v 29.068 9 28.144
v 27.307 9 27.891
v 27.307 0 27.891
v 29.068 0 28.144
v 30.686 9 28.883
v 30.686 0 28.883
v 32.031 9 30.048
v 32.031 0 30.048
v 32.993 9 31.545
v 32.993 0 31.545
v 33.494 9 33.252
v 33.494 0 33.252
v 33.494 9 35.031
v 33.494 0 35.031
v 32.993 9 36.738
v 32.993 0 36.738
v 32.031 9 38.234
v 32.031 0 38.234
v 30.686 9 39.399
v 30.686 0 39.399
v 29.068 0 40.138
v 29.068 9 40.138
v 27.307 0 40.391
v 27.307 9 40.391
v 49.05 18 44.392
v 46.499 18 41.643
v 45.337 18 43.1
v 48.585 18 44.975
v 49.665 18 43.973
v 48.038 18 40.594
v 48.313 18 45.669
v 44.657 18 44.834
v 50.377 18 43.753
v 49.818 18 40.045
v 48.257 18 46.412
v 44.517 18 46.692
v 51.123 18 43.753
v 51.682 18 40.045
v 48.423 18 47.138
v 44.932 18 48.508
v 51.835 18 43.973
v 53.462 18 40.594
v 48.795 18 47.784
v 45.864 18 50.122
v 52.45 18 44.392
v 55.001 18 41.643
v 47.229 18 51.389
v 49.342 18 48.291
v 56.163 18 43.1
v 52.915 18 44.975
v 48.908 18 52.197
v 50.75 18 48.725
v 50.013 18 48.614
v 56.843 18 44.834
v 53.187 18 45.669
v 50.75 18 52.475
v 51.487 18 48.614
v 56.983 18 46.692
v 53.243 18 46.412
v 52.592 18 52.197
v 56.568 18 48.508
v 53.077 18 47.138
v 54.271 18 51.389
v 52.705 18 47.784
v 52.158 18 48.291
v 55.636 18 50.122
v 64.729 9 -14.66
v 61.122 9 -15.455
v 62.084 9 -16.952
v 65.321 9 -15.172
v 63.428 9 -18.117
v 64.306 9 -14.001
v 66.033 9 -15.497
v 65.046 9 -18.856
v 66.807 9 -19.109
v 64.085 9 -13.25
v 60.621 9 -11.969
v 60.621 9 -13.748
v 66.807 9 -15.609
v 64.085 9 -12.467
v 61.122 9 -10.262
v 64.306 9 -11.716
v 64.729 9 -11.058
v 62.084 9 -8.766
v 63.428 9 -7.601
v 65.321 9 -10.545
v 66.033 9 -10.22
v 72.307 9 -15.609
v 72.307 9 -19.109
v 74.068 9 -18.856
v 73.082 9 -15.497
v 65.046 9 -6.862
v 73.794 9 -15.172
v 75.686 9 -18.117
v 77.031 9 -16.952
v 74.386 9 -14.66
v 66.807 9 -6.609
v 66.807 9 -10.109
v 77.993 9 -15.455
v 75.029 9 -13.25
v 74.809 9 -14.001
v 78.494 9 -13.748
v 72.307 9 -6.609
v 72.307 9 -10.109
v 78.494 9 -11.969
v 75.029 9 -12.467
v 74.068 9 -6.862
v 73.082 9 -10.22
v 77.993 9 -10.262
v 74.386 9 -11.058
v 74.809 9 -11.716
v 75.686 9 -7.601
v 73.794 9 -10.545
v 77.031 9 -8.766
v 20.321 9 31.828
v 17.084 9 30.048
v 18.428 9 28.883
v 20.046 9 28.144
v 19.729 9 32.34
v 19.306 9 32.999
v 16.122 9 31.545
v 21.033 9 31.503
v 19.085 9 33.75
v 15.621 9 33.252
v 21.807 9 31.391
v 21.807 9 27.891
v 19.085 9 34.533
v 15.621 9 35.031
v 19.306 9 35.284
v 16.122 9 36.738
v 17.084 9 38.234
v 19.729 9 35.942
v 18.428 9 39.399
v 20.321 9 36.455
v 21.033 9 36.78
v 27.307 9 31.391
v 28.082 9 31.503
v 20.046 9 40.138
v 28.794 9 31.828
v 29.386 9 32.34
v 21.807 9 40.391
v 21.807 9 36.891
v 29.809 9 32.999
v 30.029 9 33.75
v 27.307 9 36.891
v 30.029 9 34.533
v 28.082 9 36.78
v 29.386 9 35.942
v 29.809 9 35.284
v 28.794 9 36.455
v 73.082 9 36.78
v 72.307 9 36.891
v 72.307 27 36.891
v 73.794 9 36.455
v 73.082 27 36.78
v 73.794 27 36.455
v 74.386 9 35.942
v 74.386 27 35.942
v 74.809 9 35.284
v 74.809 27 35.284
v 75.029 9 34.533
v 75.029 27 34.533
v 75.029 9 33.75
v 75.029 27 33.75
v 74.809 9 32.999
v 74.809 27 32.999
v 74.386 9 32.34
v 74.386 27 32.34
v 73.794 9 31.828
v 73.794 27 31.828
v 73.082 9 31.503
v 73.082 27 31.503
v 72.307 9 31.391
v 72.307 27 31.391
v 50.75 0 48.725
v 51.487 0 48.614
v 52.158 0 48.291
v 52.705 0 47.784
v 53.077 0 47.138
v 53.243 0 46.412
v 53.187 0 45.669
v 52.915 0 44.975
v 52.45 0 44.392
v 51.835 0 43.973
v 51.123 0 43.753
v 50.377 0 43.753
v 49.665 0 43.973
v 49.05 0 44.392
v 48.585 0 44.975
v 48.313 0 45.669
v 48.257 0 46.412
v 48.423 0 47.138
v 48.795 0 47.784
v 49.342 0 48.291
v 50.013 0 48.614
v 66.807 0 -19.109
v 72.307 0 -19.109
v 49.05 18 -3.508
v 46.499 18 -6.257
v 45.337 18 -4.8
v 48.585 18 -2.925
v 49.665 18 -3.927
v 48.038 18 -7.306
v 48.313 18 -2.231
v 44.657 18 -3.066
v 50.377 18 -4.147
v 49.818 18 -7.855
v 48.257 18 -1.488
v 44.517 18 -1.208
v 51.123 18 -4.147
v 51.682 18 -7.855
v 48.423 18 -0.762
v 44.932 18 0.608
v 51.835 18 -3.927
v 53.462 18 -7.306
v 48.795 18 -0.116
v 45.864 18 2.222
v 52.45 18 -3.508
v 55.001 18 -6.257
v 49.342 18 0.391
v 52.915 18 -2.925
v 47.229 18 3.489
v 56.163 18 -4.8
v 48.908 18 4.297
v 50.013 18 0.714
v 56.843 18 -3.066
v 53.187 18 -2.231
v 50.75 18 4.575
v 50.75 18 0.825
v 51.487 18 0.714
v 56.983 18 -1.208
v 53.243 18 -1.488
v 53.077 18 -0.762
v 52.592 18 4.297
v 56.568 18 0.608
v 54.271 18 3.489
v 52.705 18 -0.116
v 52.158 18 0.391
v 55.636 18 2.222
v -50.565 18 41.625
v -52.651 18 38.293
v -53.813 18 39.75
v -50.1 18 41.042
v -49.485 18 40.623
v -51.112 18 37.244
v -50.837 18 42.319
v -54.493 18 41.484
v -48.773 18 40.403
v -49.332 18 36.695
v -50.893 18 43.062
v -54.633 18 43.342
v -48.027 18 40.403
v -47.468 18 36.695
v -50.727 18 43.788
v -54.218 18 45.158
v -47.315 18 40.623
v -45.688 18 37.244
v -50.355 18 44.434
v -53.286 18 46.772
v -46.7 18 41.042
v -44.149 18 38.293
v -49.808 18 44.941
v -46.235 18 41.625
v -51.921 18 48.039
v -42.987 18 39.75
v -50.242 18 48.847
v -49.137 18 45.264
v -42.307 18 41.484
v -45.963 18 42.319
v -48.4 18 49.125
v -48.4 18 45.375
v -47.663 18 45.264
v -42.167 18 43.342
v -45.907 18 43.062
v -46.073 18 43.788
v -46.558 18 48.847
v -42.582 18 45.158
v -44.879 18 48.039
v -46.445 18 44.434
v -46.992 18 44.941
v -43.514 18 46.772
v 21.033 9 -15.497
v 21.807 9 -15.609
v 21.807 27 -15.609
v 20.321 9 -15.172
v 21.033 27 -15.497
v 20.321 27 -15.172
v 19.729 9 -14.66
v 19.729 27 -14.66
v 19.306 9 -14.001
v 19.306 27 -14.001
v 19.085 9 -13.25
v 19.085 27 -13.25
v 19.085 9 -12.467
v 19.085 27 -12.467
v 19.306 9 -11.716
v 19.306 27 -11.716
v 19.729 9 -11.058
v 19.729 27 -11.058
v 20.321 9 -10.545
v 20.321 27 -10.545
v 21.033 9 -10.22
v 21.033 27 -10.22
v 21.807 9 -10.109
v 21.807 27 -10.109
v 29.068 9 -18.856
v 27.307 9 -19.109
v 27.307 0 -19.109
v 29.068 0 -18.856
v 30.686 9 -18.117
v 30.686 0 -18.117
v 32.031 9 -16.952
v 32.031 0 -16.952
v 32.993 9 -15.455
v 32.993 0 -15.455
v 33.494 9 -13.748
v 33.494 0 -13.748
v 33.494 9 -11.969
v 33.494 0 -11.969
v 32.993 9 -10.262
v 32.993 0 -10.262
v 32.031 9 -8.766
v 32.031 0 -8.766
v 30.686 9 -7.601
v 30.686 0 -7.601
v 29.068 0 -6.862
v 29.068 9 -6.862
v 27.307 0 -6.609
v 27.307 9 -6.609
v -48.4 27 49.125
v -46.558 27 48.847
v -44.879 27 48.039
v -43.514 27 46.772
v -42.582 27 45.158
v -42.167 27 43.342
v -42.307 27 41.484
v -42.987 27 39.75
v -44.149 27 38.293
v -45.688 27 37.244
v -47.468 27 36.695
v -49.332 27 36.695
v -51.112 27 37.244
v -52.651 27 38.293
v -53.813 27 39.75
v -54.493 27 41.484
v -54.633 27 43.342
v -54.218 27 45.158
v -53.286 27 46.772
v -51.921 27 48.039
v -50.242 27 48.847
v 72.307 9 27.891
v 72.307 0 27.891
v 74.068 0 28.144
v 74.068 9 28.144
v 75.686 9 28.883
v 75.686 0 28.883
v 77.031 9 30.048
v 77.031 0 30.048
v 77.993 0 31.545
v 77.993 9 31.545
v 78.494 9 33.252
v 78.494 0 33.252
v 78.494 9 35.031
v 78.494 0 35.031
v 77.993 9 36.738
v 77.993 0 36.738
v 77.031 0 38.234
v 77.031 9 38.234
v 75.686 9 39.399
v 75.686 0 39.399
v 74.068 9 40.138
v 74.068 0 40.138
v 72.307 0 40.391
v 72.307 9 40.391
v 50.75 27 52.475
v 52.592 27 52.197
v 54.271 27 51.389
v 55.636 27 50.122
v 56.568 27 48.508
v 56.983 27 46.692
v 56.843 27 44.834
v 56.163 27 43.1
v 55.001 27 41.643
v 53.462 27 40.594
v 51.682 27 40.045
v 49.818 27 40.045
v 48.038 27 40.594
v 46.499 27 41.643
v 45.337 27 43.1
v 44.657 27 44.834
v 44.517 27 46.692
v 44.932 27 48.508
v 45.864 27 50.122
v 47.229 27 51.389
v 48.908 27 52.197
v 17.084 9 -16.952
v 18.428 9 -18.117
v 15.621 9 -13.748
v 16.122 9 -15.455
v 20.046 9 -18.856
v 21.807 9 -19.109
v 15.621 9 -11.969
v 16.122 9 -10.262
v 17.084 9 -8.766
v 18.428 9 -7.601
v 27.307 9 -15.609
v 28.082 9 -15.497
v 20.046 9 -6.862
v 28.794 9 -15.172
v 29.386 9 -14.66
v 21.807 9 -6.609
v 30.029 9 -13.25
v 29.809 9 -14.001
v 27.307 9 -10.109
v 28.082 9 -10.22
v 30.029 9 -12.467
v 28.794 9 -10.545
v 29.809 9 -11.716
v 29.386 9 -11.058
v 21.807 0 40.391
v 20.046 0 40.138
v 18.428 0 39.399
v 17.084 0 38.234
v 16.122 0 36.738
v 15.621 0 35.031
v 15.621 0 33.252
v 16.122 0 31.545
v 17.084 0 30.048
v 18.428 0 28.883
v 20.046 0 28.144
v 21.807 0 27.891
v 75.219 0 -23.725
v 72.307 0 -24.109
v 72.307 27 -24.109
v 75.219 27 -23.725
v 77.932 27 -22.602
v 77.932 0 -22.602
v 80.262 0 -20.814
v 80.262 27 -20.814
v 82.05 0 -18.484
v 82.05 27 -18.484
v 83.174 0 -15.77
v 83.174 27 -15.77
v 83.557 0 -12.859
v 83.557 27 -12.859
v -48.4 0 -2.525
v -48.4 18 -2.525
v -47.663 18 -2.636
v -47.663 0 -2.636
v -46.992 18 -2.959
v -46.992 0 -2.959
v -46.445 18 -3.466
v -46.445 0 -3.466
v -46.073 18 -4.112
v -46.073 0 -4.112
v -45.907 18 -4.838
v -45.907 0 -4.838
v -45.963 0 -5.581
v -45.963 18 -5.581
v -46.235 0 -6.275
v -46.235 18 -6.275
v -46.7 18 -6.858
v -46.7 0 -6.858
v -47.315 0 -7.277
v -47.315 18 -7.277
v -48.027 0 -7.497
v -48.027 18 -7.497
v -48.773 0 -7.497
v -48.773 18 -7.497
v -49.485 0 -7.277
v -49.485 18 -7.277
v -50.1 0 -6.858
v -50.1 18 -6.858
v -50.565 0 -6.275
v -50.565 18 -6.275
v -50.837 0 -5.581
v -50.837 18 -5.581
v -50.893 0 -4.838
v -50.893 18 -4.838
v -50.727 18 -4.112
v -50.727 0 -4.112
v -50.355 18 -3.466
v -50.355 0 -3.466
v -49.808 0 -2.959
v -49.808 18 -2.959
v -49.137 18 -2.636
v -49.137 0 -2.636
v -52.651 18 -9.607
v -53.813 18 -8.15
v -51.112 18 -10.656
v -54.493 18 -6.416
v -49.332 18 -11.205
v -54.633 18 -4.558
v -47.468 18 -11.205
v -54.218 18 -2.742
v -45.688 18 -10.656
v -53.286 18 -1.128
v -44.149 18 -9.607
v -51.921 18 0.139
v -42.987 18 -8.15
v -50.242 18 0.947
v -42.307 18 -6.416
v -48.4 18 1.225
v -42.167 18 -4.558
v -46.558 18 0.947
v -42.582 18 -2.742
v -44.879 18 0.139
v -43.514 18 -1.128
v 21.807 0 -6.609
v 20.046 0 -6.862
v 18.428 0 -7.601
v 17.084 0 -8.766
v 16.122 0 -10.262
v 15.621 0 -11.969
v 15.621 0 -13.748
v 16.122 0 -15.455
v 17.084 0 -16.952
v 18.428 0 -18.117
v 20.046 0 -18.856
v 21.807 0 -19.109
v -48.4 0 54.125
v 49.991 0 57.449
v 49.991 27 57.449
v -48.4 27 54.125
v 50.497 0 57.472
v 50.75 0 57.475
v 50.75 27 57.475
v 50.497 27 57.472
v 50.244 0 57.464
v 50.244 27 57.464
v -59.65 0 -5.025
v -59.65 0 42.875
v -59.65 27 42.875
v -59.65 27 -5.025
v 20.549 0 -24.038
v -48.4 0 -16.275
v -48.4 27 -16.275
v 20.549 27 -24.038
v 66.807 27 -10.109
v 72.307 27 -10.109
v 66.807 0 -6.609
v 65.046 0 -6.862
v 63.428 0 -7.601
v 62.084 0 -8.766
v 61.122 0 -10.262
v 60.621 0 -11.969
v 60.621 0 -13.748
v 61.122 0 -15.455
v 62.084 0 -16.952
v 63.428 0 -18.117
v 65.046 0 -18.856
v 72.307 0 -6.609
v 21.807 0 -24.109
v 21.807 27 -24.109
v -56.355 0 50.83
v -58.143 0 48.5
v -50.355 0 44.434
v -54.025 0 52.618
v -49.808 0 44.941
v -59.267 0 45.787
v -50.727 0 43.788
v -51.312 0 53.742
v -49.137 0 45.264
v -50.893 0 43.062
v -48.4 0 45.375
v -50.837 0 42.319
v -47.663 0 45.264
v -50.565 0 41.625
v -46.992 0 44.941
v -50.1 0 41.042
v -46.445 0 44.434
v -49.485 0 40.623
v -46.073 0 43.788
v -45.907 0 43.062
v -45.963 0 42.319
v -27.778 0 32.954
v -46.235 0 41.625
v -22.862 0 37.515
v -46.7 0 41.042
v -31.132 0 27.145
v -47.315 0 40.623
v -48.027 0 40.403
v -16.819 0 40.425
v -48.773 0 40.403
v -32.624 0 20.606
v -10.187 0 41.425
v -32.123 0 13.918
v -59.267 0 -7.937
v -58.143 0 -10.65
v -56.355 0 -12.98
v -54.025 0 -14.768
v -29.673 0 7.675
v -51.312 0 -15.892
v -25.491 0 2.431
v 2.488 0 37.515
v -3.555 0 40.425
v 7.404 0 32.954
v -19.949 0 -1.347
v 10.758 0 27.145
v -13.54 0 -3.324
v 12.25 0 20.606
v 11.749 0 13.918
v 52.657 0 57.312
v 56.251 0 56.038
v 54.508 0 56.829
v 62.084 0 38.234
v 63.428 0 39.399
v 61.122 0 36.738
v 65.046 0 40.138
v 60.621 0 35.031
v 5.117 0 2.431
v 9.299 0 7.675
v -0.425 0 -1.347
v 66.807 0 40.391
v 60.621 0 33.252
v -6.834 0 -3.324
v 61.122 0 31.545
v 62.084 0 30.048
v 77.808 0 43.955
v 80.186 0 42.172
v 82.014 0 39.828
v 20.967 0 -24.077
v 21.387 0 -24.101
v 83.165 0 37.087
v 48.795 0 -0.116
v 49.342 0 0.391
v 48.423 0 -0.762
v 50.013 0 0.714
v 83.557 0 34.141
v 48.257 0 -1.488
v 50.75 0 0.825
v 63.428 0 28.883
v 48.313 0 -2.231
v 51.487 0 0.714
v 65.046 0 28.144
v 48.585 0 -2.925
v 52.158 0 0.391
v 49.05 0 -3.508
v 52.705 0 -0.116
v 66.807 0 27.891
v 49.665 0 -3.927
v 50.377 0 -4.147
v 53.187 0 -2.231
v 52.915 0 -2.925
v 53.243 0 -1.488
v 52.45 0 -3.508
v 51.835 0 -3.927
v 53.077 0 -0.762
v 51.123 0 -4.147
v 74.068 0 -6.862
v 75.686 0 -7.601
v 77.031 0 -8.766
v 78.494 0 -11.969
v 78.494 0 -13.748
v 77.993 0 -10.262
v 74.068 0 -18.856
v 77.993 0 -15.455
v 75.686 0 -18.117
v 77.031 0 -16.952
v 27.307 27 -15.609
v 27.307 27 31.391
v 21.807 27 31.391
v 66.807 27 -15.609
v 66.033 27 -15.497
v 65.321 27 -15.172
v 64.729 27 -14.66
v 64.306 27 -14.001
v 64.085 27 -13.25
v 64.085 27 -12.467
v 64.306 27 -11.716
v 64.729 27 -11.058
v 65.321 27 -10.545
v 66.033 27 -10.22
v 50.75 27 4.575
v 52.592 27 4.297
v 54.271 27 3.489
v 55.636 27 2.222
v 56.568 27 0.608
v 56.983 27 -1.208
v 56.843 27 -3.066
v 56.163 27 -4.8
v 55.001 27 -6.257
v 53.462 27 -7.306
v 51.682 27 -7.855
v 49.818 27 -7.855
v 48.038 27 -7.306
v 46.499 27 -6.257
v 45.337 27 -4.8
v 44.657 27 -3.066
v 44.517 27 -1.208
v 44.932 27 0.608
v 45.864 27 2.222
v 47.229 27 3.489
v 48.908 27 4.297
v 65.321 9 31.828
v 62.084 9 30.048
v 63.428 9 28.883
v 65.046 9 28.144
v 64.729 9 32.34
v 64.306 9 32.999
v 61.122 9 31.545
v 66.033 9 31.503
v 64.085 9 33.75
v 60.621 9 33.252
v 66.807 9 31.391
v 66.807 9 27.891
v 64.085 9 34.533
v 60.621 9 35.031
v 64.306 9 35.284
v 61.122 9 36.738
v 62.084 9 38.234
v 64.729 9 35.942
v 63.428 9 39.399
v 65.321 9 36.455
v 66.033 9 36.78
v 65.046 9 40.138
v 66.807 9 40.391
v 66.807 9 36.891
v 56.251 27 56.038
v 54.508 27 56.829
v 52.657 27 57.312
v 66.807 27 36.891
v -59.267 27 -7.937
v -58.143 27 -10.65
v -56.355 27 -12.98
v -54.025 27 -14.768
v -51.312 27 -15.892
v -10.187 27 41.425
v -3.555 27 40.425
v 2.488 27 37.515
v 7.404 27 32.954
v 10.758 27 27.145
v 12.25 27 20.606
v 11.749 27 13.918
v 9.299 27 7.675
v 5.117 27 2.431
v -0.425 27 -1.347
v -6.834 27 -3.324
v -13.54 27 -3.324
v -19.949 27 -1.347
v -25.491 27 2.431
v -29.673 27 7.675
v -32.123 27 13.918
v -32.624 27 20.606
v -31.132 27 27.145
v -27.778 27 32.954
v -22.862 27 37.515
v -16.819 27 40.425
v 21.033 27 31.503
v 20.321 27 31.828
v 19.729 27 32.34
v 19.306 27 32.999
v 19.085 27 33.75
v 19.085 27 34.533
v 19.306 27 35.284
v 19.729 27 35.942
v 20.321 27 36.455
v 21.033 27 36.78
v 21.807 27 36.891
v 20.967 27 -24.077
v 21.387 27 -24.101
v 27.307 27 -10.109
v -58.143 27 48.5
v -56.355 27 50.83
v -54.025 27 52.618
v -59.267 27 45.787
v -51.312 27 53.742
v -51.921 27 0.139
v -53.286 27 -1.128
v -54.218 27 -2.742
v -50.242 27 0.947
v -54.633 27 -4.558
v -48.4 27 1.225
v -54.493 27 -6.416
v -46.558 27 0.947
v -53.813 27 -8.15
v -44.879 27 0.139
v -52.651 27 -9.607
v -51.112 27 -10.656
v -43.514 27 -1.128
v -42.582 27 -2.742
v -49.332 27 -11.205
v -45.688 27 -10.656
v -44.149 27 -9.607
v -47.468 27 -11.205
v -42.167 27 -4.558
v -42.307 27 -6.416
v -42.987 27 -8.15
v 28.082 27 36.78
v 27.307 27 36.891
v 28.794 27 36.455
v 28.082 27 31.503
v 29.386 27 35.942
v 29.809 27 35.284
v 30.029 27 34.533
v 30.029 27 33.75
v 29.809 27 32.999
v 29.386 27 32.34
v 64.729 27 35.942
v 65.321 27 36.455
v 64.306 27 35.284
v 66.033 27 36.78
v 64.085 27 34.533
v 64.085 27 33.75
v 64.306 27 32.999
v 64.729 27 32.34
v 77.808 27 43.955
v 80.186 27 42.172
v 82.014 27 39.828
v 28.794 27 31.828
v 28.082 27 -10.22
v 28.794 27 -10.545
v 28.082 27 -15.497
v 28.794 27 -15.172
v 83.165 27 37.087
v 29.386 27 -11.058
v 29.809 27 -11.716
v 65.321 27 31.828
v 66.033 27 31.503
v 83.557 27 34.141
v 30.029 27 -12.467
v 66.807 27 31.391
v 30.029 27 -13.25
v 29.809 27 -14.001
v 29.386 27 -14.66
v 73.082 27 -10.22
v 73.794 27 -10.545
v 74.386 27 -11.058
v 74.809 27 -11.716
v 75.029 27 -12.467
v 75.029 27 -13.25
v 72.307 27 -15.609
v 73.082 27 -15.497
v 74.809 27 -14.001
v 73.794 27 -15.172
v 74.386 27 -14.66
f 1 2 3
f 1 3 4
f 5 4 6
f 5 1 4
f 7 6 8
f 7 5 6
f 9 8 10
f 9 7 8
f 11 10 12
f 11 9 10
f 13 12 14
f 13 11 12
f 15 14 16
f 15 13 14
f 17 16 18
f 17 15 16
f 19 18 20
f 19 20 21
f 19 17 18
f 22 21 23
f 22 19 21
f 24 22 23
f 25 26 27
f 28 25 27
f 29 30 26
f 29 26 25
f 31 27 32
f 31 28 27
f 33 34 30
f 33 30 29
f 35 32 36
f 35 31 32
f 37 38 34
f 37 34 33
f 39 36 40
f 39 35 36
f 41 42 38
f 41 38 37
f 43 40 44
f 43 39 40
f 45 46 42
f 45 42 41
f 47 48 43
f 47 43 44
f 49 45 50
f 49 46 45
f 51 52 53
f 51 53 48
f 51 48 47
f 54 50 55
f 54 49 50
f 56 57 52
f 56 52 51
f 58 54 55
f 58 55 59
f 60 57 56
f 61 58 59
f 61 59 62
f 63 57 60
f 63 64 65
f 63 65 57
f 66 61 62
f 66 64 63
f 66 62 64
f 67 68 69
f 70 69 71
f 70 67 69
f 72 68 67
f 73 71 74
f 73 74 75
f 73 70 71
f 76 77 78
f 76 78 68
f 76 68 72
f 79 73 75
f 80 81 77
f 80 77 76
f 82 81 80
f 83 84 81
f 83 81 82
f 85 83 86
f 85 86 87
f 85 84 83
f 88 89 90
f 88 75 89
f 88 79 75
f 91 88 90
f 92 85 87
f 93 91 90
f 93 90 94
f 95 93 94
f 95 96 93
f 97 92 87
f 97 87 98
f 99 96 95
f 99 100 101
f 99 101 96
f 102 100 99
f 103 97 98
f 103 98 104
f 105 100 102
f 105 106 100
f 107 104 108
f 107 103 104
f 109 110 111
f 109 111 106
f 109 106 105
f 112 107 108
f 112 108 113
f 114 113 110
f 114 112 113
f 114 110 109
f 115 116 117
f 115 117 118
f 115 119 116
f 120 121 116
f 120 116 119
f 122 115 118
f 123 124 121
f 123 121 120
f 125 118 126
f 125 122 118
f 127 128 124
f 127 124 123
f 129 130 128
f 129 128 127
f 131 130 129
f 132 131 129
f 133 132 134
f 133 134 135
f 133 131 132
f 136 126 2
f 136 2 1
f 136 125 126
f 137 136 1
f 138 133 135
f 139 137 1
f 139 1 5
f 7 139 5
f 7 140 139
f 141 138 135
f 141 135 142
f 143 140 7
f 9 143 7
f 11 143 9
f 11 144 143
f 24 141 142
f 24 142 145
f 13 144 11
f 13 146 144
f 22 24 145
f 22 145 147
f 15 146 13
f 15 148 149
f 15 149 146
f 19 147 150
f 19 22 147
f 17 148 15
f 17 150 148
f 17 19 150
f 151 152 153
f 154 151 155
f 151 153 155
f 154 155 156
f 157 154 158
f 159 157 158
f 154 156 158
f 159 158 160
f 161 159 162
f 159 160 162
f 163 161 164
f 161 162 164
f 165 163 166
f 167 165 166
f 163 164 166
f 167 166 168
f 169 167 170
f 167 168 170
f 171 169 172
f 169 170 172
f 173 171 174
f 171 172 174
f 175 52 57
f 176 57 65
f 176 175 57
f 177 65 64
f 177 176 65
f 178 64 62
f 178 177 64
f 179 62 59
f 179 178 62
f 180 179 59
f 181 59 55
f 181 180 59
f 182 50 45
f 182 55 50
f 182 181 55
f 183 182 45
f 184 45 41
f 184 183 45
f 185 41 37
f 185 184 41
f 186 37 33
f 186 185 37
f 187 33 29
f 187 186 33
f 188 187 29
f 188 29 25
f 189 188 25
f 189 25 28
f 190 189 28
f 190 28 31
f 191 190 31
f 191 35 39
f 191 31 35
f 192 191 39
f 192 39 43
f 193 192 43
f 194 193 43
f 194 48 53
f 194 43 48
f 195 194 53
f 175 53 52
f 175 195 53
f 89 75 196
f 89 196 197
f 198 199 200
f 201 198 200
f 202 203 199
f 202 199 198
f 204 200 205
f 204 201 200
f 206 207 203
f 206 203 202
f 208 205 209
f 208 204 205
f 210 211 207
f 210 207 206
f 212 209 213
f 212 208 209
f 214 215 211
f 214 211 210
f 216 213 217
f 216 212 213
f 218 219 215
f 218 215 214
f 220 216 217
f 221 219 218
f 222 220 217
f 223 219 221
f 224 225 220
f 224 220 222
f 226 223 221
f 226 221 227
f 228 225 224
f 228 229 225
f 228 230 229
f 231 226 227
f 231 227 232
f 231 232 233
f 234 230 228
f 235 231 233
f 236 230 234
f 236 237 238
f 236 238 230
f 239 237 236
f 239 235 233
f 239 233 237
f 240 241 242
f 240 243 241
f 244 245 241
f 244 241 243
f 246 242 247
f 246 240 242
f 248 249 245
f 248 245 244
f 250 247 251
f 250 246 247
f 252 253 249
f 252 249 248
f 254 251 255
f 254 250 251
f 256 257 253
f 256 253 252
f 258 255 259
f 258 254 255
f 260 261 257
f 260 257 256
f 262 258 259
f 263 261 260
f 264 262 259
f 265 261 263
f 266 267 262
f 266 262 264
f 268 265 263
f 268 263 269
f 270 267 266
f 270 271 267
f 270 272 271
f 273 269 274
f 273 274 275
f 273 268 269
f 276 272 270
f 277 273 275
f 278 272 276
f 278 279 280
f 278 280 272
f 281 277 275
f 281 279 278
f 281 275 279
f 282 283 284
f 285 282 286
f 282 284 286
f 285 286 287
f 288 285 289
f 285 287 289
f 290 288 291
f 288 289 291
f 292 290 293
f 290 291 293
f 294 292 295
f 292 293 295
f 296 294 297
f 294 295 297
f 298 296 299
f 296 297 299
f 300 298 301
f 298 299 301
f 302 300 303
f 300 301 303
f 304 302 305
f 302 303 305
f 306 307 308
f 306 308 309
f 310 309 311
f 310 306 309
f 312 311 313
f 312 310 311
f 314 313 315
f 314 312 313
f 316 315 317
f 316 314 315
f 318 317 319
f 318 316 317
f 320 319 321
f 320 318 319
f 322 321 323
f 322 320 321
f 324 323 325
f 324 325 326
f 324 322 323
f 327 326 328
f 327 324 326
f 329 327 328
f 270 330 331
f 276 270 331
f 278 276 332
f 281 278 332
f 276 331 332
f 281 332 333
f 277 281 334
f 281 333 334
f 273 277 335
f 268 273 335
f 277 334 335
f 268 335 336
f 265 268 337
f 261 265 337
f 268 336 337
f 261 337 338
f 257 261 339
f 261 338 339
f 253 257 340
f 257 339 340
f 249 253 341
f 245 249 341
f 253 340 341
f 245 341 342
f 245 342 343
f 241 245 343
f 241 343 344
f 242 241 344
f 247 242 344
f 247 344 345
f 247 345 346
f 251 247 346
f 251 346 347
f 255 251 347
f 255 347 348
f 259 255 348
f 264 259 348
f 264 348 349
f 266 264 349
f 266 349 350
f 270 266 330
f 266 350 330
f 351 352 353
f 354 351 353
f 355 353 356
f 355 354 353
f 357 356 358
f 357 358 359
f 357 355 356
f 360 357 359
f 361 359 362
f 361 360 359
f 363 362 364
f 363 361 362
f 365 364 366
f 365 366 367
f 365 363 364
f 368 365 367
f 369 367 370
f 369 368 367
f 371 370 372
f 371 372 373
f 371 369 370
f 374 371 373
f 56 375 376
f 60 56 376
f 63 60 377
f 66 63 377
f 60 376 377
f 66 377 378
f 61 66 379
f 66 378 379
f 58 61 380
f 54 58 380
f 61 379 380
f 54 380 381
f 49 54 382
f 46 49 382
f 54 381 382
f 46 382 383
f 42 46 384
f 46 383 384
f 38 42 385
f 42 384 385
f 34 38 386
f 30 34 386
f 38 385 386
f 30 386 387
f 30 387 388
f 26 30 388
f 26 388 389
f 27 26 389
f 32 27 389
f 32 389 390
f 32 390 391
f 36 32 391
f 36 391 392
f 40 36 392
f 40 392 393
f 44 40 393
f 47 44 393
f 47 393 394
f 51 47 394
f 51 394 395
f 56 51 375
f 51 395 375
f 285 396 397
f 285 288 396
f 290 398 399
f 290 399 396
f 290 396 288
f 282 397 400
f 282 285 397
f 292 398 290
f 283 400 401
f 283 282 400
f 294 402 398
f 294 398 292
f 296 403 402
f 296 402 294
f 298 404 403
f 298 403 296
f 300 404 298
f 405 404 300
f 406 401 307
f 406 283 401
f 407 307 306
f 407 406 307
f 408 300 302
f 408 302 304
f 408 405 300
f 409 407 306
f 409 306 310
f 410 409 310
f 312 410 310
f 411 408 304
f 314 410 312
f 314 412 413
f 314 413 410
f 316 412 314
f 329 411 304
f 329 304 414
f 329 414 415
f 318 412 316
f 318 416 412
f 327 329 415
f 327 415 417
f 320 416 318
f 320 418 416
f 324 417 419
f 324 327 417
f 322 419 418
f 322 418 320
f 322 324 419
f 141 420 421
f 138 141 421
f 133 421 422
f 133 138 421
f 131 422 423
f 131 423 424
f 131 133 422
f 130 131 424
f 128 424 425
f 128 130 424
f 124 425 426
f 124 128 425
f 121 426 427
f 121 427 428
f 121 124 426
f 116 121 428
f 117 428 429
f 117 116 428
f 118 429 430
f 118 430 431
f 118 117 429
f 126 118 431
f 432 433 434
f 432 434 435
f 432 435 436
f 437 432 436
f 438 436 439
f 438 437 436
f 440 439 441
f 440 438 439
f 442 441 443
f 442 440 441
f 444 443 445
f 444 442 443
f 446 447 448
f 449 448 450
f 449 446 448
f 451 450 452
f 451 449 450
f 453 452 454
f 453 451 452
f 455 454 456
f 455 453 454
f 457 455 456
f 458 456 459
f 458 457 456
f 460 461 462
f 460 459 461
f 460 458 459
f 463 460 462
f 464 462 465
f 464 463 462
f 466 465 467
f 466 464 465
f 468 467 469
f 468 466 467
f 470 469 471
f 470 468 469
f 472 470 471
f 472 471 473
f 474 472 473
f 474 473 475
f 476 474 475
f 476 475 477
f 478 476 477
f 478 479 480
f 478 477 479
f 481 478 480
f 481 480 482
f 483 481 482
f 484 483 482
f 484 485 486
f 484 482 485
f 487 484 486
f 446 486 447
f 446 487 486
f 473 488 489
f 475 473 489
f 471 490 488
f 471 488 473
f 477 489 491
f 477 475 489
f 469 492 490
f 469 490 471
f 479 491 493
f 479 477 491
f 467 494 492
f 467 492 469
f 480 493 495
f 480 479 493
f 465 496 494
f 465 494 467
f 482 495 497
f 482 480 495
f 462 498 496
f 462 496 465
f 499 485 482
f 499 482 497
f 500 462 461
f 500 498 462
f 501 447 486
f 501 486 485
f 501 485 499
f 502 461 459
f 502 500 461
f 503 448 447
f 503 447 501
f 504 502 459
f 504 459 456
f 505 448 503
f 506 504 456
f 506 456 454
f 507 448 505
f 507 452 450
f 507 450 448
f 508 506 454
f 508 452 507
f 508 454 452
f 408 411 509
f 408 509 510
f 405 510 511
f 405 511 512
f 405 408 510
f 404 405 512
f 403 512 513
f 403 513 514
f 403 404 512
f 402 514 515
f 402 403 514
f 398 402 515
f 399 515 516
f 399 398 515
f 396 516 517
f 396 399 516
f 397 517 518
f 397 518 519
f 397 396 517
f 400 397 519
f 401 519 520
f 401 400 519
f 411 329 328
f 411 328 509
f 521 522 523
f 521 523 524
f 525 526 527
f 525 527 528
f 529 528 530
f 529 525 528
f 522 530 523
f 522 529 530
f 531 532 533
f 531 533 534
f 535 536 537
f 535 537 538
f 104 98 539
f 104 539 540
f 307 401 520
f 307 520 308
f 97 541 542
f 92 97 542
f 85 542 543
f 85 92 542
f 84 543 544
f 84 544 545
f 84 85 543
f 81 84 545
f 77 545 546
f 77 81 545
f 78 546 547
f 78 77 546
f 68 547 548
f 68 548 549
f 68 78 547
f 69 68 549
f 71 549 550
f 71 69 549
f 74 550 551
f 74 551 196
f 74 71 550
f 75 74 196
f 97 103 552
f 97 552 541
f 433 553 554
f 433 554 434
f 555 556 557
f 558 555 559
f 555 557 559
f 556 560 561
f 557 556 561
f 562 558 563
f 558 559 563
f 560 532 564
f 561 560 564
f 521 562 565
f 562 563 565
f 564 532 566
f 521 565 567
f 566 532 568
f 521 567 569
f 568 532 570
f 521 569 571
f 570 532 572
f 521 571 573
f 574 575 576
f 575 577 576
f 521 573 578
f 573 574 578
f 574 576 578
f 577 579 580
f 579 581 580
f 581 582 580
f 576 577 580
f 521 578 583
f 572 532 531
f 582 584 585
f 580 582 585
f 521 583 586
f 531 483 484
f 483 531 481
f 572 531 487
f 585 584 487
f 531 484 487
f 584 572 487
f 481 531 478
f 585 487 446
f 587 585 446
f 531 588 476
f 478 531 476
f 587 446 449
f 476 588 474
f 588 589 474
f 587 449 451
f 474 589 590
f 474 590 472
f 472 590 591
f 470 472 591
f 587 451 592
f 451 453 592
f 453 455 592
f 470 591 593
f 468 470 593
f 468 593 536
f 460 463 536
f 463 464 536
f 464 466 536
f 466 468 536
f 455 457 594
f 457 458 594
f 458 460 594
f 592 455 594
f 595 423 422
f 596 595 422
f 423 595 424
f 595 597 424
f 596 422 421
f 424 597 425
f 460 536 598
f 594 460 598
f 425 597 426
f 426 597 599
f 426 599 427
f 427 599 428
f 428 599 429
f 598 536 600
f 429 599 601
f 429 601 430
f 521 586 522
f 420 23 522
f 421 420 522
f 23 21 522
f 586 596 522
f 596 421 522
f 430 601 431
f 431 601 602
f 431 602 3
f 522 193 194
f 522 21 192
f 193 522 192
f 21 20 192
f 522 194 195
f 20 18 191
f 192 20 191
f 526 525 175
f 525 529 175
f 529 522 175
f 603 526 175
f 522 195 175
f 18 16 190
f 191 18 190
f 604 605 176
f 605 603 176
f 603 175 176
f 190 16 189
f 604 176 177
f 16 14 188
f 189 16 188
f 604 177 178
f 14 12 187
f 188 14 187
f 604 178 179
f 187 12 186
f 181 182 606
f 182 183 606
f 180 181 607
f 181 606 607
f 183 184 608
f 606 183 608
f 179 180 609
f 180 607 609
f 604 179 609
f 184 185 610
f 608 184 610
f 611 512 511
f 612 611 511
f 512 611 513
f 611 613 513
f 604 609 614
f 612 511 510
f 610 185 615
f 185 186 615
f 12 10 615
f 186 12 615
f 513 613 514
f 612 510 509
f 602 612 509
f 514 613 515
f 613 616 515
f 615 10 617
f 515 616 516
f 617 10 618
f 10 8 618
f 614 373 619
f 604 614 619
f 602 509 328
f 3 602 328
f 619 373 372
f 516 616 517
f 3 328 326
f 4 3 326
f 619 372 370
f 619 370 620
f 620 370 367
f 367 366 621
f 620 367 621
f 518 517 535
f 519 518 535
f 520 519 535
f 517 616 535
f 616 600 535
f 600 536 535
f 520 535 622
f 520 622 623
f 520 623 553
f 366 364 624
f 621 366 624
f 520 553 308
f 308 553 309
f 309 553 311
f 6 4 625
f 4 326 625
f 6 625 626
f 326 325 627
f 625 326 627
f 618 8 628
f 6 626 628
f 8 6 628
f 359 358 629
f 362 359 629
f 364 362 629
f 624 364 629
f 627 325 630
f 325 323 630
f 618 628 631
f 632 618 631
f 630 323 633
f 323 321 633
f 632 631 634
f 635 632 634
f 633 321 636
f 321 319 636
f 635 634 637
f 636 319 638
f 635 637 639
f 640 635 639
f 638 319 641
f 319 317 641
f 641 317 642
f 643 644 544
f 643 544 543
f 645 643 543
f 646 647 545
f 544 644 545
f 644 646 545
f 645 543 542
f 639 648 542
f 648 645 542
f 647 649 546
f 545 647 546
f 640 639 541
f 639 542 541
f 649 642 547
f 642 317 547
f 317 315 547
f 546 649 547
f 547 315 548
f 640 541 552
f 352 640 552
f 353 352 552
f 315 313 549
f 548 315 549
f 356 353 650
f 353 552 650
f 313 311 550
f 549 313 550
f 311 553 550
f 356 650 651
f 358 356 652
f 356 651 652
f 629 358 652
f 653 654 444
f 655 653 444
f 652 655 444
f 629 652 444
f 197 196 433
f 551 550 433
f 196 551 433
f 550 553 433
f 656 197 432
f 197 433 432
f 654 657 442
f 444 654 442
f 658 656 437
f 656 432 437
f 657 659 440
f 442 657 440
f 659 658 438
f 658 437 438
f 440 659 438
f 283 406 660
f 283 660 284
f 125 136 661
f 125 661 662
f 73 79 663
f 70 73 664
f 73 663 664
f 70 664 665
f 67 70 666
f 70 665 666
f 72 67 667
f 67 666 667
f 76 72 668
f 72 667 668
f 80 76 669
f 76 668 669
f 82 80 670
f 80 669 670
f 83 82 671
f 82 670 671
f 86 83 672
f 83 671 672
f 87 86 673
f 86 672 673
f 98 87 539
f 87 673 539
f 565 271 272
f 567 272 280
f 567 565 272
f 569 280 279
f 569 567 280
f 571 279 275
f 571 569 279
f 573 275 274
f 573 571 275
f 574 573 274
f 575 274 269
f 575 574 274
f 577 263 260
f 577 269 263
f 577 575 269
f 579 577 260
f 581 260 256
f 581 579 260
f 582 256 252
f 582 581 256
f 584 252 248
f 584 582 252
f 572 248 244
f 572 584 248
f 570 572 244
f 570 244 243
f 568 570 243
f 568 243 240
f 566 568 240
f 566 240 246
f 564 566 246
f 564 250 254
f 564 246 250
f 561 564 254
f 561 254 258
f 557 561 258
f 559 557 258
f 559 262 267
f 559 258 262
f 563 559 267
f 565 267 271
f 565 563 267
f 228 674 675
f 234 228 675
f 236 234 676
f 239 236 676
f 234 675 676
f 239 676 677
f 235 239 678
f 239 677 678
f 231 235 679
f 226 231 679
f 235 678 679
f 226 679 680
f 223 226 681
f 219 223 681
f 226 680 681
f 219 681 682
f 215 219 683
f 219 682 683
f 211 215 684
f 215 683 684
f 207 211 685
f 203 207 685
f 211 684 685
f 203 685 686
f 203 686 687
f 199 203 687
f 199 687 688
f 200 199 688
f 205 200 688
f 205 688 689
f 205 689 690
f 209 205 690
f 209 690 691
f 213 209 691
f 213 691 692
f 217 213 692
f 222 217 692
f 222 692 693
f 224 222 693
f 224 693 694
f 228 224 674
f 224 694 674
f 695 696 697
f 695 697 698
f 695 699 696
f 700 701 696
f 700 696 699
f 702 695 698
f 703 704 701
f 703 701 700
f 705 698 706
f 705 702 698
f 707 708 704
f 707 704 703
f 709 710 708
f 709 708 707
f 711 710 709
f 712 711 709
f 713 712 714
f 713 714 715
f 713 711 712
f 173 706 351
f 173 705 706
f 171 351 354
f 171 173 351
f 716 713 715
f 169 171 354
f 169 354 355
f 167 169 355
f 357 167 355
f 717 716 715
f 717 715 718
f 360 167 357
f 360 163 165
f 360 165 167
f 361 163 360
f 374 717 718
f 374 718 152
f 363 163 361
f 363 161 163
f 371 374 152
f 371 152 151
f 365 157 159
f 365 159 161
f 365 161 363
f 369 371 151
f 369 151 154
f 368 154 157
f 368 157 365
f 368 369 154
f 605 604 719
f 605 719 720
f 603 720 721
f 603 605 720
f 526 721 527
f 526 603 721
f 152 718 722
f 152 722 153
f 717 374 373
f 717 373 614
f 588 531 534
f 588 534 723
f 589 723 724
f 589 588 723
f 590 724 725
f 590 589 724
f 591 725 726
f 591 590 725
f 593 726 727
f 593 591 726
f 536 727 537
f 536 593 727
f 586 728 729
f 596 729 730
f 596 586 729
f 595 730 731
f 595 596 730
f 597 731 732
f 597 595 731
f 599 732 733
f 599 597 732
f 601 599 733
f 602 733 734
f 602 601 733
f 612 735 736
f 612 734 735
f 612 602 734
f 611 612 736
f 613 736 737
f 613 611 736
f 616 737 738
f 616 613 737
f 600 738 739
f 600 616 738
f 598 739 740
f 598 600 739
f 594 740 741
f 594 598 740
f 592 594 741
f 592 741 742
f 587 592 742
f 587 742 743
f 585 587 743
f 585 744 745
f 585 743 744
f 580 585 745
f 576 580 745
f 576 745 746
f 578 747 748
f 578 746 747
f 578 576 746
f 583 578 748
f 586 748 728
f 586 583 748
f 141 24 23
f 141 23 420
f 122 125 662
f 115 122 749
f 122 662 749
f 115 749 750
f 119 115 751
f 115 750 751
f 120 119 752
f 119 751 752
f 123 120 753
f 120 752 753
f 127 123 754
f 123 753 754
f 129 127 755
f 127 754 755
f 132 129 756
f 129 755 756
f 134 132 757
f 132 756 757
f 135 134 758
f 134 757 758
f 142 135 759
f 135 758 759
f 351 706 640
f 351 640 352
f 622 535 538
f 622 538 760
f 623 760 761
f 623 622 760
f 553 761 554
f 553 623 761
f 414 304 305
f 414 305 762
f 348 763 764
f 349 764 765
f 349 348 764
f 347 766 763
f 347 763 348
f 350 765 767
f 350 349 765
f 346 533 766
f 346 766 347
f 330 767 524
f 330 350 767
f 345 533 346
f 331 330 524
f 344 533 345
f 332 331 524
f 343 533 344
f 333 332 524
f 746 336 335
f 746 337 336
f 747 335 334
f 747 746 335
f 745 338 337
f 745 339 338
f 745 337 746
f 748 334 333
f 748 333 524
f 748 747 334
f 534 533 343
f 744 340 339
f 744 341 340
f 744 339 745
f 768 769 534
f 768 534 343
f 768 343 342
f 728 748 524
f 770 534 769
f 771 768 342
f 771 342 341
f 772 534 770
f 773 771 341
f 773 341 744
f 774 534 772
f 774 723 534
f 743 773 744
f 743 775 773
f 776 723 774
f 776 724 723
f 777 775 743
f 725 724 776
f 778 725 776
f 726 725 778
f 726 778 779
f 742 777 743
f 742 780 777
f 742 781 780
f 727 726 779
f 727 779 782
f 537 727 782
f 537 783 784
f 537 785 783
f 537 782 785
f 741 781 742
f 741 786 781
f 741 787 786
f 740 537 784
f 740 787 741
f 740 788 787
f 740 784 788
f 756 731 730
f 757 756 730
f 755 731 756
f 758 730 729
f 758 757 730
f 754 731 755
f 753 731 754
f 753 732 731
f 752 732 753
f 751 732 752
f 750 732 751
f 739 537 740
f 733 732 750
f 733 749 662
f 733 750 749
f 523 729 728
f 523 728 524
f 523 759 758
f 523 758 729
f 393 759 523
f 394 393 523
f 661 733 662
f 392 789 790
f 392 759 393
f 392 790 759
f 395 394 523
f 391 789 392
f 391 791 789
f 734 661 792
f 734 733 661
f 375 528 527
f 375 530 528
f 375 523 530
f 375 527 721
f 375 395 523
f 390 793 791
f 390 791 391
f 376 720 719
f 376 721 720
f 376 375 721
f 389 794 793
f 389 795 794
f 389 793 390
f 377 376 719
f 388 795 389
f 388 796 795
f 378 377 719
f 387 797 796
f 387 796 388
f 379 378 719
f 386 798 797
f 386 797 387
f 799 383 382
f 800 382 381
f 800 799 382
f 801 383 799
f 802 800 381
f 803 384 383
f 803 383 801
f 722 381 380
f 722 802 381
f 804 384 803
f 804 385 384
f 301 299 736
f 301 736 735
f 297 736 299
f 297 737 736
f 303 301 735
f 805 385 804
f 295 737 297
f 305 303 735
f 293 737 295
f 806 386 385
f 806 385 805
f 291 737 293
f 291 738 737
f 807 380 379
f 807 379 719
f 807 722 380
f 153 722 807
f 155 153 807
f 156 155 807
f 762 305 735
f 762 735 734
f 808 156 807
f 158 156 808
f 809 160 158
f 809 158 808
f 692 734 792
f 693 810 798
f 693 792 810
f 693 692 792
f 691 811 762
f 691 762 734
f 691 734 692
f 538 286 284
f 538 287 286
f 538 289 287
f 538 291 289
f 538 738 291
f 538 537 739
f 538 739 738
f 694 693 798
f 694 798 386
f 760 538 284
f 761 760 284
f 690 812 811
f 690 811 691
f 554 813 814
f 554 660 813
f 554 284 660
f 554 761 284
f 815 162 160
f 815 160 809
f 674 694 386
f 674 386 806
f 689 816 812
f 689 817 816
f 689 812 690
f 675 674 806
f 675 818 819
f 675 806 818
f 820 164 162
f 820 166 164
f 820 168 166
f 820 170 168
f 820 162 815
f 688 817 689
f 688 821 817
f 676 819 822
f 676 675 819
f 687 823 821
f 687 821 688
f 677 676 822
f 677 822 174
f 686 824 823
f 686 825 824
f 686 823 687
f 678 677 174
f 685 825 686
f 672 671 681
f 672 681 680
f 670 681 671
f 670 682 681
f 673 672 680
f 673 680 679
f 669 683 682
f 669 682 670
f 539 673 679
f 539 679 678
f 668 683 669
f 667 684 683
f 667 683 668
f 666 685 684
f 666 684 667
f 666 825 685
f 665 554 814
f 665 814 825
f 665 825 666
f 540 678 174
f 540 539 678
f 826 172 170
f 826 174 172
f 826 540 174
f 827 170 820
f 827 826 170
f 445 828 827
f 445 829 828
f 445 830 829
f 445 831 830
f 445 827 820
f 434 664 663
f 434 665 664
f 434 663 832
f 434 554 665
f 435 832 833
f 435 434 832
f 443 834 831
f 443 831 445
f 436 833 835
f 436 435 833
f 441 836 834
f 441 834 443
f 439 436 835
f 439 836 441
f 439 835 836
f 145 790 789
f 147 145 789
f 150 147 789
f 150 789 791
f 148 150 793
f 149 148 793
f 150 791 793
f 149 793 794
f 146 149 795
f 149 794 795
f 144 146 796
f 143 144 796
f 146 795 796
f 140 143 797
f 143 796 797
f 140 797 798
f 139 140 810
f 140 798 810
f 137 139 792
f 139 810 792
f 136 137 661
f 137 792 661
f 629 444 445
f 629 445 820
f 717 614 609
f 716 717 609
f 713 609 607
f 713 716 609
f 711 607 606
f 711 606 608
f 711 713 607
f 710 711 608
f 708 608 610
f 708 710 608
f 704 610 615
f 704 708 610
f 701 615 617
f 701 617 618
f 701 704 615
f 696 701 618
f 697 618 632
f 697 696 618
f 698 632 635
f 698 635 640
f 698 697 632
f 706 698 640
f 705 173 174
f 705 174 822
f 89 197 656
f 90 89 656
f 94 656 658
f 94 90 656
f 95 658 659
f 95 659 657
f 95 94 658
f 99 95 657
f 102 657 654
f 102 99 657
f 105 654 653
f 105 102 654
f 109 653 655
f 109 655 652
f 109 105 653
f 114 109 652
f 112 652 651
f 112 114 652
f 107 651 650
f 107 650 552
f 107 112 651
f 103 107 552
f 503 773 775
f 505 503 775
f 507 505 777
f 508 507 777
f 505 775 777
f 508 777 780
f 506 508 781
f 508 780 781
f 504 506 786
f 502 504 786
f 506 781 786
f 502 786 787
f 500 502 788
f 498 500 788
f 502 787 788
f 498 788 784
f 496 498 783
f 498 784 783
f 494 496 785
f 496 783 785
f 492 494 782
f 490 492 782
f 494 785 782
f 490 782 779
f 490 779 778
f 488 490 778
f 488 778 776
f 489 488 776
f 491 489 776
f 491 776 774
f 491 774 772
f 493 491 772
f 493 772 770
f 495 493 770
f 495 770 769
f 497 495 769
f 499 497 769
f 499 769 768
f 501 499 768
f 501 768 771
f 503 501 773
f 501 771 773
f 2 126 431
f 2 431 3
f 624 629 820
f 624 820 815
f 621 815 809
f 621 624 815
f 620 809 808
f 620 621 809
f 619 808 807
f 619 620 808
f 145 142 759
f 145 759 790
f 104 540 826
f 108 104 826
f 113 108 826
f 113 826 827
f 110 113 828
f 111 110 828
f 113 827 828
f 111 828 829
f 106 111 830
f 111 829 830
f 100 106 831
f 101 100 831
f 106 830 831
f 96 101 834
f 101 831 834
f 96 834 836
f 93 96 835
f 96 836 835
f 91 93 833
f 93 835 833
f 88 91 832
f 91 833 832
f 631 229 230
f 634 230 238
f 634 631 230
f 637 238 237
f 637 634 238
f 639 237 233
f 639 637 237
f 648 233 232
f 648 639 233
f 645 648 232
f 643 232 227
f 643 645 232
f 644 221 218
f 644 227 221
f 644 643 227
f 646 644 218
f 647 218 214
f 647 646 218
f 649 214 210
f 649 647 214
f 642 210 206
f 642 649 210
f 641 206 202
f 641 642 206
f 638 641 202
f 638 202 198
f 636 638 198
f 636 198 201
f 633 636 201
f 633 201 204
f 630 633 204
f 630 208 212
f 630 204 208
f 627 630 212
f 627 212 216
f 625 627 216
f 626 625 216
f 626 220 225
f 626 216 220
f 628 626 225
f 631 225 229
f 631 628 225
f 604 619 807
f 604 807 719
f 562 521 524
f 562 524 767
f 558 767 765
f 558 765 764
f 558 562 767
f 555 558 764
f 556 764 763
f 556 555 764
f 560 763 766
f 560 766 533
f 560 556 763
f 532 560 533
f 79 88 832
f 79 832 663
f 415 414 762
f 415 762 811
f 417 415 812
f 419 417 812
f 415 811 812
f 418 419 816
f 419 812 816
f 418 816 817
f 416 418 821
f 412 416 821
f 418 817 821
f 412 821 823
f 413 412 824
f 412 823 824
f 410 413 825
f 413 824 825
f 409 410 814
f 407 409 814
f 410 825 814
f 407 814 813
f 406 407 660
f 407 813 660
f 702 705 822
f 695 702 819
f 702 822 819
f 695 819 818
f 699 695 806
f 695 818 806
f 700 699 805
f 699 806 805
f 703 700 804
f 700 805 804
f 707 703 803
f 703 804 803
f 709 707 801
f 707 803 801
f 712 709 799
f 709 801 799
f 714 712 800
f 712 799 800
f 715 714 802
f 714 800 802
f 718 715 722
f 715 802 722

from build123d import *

# Parameters (mm, degrees)
SKETCH1_W           = 150.5
SKETCH1_H           = 110.25
SKETCH1_R           = 2.5
BOSS_EXTRUDE1_DEPTH = 27
SKETCH3_W           = 300
SKETCH3_H           = 200
SKETCH3_W_2         = 150.5
SKETCH3_H_2         = 110.25
BOSS_EXTRUDE2_DEPTH = 27
SKETCH4_R           = 6.25
CUT_EXTRUDE2_DEPTH  = 9
SKETCH5_R           = 2.75
CUT_EXTRUDE3_DEPTH  = 183.288233301
CUT_EXTRUDE4_START  = -9
CUT_EXTRUDE4_DEPTH  = 9
SKETCH7_W           = 300
SKETCH7_H           = 200
SKETCH7_R           = 22.5
CUT_EXTRUDE5_DEPTH  = 183.288233301


with BuildPart() as part:
    # Sketch1 → Boss-Extrude1 (new body)
    with BuildSketch(Plane(origin=(0, 0, 0), x_dir=(1, 0, 0), z_dir=(0, 1, 0))):
        Rectangle(SKETCH1_W, SKETCH1_H)
        with Locations(Location((-48.4, -42.875, 0), (0, 0, 270))):
            Circle(SKETCH1_R, mode=Mode.SUBTRACT)
        with Locations(Location((50.75, -46.225, 0), (0, 0, 270))):
            Circle(SKETCH1_R, mode=Mode.SUBTRACT)
        with Locations(Location((-48.4, 5.025, 0), (0, 0, 270))):
            Circle(SKETCH1_R, mode=Mode.SUBTRACT)
        with Locations(Location((50.75, 1.675, 0), (0, 0, 270))):
            Circle(SKETCH1_R, mode=Mode.SUBTRACT)
    extrude(amount=BOSS_EXTRUDE1_DEPTH)

    # Sketch3 → Boss-Extrude2 (add)
    with BuildSketch(Plane(origin=(0, 0, 0), x_dir=(1, 0, 0), z_dir=(0, 1, 0))):
        Rectangle(SKETCH3_W, SKETCH3_H)
        Rectangle(SKETCH3_W_2, SKETCH3_H_2, mode=Mode.SUBTRACT)
    extrude(amount=BOSS_EXTRUDE2_DEPTH)

    # Sketch4 → Cut-Extrude2 (cut)
    with BuildSketch(Plane(origin=(0, 27, 0), x_dir=(1, 0, 0), z_dir=(0, 1, 0))):
        with Locations(Location((-48.4, 5.025, 0), (0, 0, 270))):
            Circle(SKETCH4_R)
        with Locations(Location((-48.4, -42.875, 0), (0, 0, 270))):
            Circle(SKETCH4_R)
        with Locations(Location((50.75, -46.225, 0), (0, 0, 270))):
            Circle(SKETCH4_R)
        with Locations(Location((50.75, 1.675, 0), (0, 0, 270))):
            Circle(SKETCH4_R)
    extrude(amount=-CUT_EXTRUDE2_DEPTH, mode=Mode.SUBTRACT)

    # Sketch5 → Cut-Extrude3 (cut, through all)
    with BuildSketch(Plane(origin=(0, 27, 0), x_dir=(1, 0, 0), z_dir=(0, 1, 0))):
        with Locations((21.807305742, 12.85873859)):
            Circle(SKETCH5_R)
        with Locations((24.557305742, 12.85873859)):
            Circle(SKETCH5_R)
        with Locations((27.307305742, 12.85873859)):
            Circle(SKETCH5_R)
        with BuildLine():
            Line((27.307305742, 15.60873859), (24.557305742, 15.60873859))
            ThreePointArc((24.557305742, 15.60873859), (25.269058116, 15.515034613), (25.932305742, 15.240308451))
            ThreePointArc((25.932305742, 15.240308451), (26.595553368, 15.515034613), (27.307305742, 15.60873859))
        make_face()
        with BuildLine():
            Line((24.557305742, 15.60873859), (21.807305742, 15.60873859))
            ThreePointArc((21.807305742, 15.60873859), (22.519058116, 15.515034613), (23.182305742, 15.240308451))
            ThreePointArc((23.182305742, 15.240308451), (23.845553368, 15.515034613), (24.557305742, 15.60873859))
        make_face()
        with BuildLine():
            ThreePointArc((23.182305742, 10.47716873), (22.519058116, 10.202442568), (21.807305742, 10.10873859))
            Line((21.807305742, 10.10873859), (24.557305742, 10.10873859))
            ThreePointArc((24.557305742, 10.10873859), (23.845553368, 10.202442568), (23.182305742, 10.47716873))
        make_face()
        with BuildLine():
            ThreePointArc((25.932305742, 10.47716873), (25.269058116, 10.202442568), (24.557305742, 10.10873859))
            Line((24.557305742, 10.10873859), (27.307305742, 10.10873859))
            ThreePointArc((27.307305742, 10.10873859), (26.595553368, 10.202442568), (25.932305742, 10.47716873))
        make_face()
        with Locations((69.557305742, 12.85873859)):
            Circle(SKETCH5_R)
        with Locations((66.807305742, 12.85873859)):
            Circle(SKETCH5_R)
        with Locations((72.307305742, 12.85873859)):
            Circle(SKETCH5_R)
        with BuildLine():
            Line((69.557305742, 15.60873859), (66.807305742, 15.60873859))
            ThreePointArc((66.807305742, 15.60873859), (67.519058116, 15.515034613), (68.182305742, 15.240308451))
            ThreePointArc((68.182305742, 15.240308451), (68.845553368, 15.515034613), (69.557305742, 15.60873859))
        make_face()
        with BuildLine():
            ThreePointArc((70.932305742, 15.240308451), (71.595553368, 15.515034613), (72.307305742, 15.60873859))
            Line((72.307305742, 15.60873859), (69.557305742, 15.60873859))
            ThreePointArc((69.557305742, 15.60873859), (70.269058116, 15.515034613), (70.932305742, 15.240308451))
        make_face()
        with BuildLine():
            Line((66.807305742, 10.10873859), (69.557305742, 10.10873859))
            ThreePointArc((69.557305742, 10.10873859), (68.845553368, 10.202442568), (68.182305742, 10.47716873))
            ThreePointArc((68.182305742, 10.47716873), (67.519058116, 10.202442568), (66.807305742, 10.10873859))
        make_face()
        with BuildLine():
            Line((69.557305742, 10.10873859), (72.307305742, 10.10873859))
            ThreePointArc((72.307305742, 10.10873859), (71.595553368, 10.202442568), (70.932305742, 10.47716873))
            ThreePointArc((70.932305742, 10.47716873), (70.269058116, 10.202442568), (69.557305742, 10.10873859))
        make_face()
        with Locations((66.807305742, -34.14126141)):
            Circle(SKETCH5_R)
        with Locations((69.557305742, -34.14126141)):
            Circle(SKETCH5_R)
        with Locations((72.307305742, -34.14126141)):
            Circle(SKETCH5_R)
        with BuildLine():
            ThreePointArc((70.932305742, -31.759691549), (71.595553368, -31.484965387), (72.307305742, -31.39126141))
            Line((72.307305742, -31.39126141), (69.557305742, -31.39126141))
            ThreePointArc((69.557305742, -31.39126141), (70.269058116, -31.484965387), (70.932305742, -31.759691549))
        make_face()
        with BuildLine():
            Line((69.557305742, -31.39126141), (66.807305742, -31.39126141))
            ThreePointArc((66.807305742, -31.39126141), (67.519058116, -31.484965387), (68.182305742, -31.759691549))
            ThreePointArc((68.182305742, -31.759691549), (68.845553368, -31.484965387), (69.557305742, -31.39126141))
        make_face()
        with BuildLine():
            Line((69.557305801, -36.89126141), (72.307305742, -36.89126141))
            ThreePointArc((72.307305742, -36.89126141), (71.595553368, -36.797557432), (70.932305742, -36.52283127))
            ThreePointArc((70.932305742, -36.52283127), (70.269058145, -36.797557424), (69.557305801, -36.89126141))
        make_face()
        with BuildLine():
            Line((66.807305742, -36.89126141), (69.557305801, -36.89126141))
            ThreePointArc((69.557305801, -36.89126141), (68.845553397, -36.79755744), (68.182305742, -36.52283127))
            ThreePointArc((68.182305742, -36.52283127), (67.519058116, -36.797557432), (66.807305742, -36.89126141))
        make_face()
        with Locations((21.807305742, -34.14126141)):
            Circle(SKETCH5_R)
        with Locations((24.557305742, -34.14126141)):
            Circle(SKETCH5_R)
        with Locations((27.307305742, -34.14126141)):
            Circle(SKETCH5_R)
        with BuildLine():
            Line((24.557305824, -31.39126141), (21.807305742, -31.39126141))
            ThreePointArc((21.807305742, -31.39126141), (22.519058116, -31.484965387), (23.182305742, -31.759691549))
            ThreePointArc((23.182305742, -31.759691549), (23.845553407, -31.484965377), (24.557305824, -31.39126141))
        make_face()
        with BuildLine():
            Line((27.307305742, -31.39126141), (24.557305824, -31.39126141))
            ThreePointArc((24.557305824, -31.39126141), (25.269058156, -31.484965398), (25.932305742, -31.759691549))
            ThreePointArc((25.932305742, -31.759691549), (26.595553368, -31.484965387), (27.307305742, -31.39126141))
        make_face()
        with BuildLine():
            ThreePointArc((25.932305742, -36.52283127), (25.269058116, -36.797557432), (24.557305742, -36.89126141))
            Line((24.557305742, -36.89126141), (27.307305742, -36.89126141))
            ThreePointArc((27.307305742, -36.89126141), (26.595553368, -36.797557432), (25.932305742, -36.52283127))
        make_face()
        with BuildLine():
            ThreePointArc((23.182305742, -36.52283127), (22.519058116, -36.797557432), (21.807305742, -36.89126141))
            Line((21.807305742, -36.89126141), (24.557305742, -36.89126141))
            ThreePointArc((24.557305742, -36.89126141), (23.845553368, -36.797557432), (23.182305742, -36.52283127))
        make_face()
    extrude(amount=-CUT_EXTRUDE3_DEPTH, mode=Mode.SUBTRACT)

    # Sketch6 → Cut-Extrude4 (cut)
    # profile 1 of 4: a face of its own
    with BuildSketch(Plane.XZ.offset(CUT_EXTRUDE4_START)):
        with BuildLine():
            ThreePointArc((21.807305742, 40.39126141), (15.557305742, 34.14126141), (21.807305742, 27.89126141))
            Line((21.807305742, 27.89126141), (27.307305742, 27.89126141))
            ThreePointArc((27.307305742, 27.89126141), (33.557305742, 34.14126141), (27.307305742, 40.39126141))
            Line((27.307305742, 40.39126141), (21.807305742, 40.39126141))
        make_face()
        with BuildLine():
            Line((21.807305742, 36.89126141), (27.307305742, 36.89126141))
            ThreePointArc((27.307305742, 36.89126141), (30.057305742, 34.14126141), (27.307305742, 31.39126141))
            Line((27.307305742, 31.39126141), (21.807305742, 31.39126141))
            ThreePointArc((21.807305742, 31.39126141), (19.057305742, 34.14126141), (21.807305742, 36.89126141))
        make_face(mode=Mode.SUBTRACT)
    # profile 2 of 4: a face of its own
    with BuildSketch(Plane.XZ.offset(CUT_EXTRUDE4_START)):
        with BuildLine():
            ThreePointArc((72.307305742, 27.89126141), (78.557305742, 34.14126141), (72.307305742, 40.39126141))
            Line((72.307305742, 40.39126141), (66.807305742, 40.39126141))
            ThreePointArc((66.807305742, 40.39126141), (60.557305742, 34.14126141), (66.807305742, 27.89126141))
            Line((66.807305742, 27.89126141), (72.307305742, 27.89126141))
        make_face()
        with BuildLine():
            Line((72.307305742, 31.39126141), (66.807305742, 31.39126141))
            ThreePointArc((66.807305742, 31.39126141), (64.057305742, 34.14126141), (66.807305742, 36.89126141))
            Line((66.807305742, 36.89126141), (72.307305742, 36.89126141))
            ThreePointArc((72.307305742, 36.89126141), (75.057305742, 34.14126141), (72.307305742, 31.39126141))
        make_face(mode=Mode.SUBTRACT)
    # profile 3 of 4: a face of its own
    with BuildSketch(Plane.XZ.offset(CUT_EXTRUDE4_START)):
        with BuildLine():
            ThreePointArc((72.307305742, -19.10873859), (78.557305742, -12.85873859), (72.307305742, -6.60873859))
            Line((72.307305742, -6.60873859), (66.807305742, -6.60873859))
            ThreePointArc((66.807305742, -6.60873859), (60.557305742, -12.85873859), (66.807305742, -19.10873859))
            Line((66.807305742, -19.10873859), (72.307305742, -19.10873859))
        make_face()
        with BuildLine():
            Line((72.307305742, -15.60873859), (66.807305742, -15.60873859))
            ThreePointArc((66.807305742, -15.60873859), (64.057305742, -12.85873859), (66.807305742, -10.10873859))
            Line((66.807305742, -10.10873859), (72.307305742, -10.10873859))
            ThreePointArc((72.307305742, -10.10873859), (75.057305742, -12.85873859), (72.307305742, -15.60873859))
        make_face(mode=Mode.SUBTRACT)
    # profile 4 of 4: a face of its own
    with BuildSketch(Plane.XZ.offset(CUT_EXTRUDE4_START)):
        with BuildLine():
            ThreePointArc((21.807305742, -6.60873859), (15.557305742, -12.85873859), (21.807305742, -19.10873859))
            Line((21.807305742, -19.10873859), (27.307305742, -19.10873859))
            ThreePointArc((27.307305742, -19.10873859), (33.557305742, -12.85873859), (27.307305742, -6.60873859))
            Line((27.307305742, -6.60873859), (21.807305742, -6.60873859))
        make_face()
        with BuildLine():
            Line((21.807305742, -10.10873859), (27.307305742, -10.10873859))
            ThreePointArc((27.307305742, -10.10873859), (30.057305742, -12.85873859), (27.307305742, -15.60873859))
            Line((27.307305742, -15.60873859), (21.807305742, -15.60873859))
            ThreePointArc((21.807305742, -15.60873859), (19.057305742, -12.85873859), (21.807305742, -10.10873859))
        make_face(mode=Mode.SUBTRACT)
    extrude(amount=CUT_EXTRUDE4_DEPTH, mode=Mode.SUBTRACT)

    # Sketch7 → Cut-Extrude5 (cut, through all)
    # profile 1 of 2: a face of its own
    with BuildSketch(Plane(origin=(0, 0, 0), x_dir=(1, 0, 0), z_dir=(0, 1, 0))):
        Rectangle(SKETCH7_W, SKETCH7_H)
        with BuildLine():
            Line((-59.65, -42.875), (-59.65, 5.025))
            ThreePointArc((-59.65, 5.025), (-56.354951288, 12.979951288), (-48.4, 16.275))
            Line((-48.4, 16.275), (20.548592348, 24.038100853))
            ThreePointArc((20.548592348, 24.038100853), (21.176958794, 24.091065274), (21.807305742, 24.10873859))
            Line((21.807305742, 24.10873859), (72.307305742, 24.10873859))
            ThreePointArc((72.307305742, 24.10873859), (80.26225703, 20.813689879), (83.557305742, 12.85873859))
            Line((83.557305742, 12.85873859), (83.557305742, -34.14126141))
            ThreePointArc((83.557305742, -34.14126141), (82.014178767, -39.828010575), (77.808129551, -43.95469289))
            Line((77.808129551, -43.95469289), (56.250823809, -56.03843148))
            ThreePointArc((56.250823809, -56.03843148), (53.592656842, -57.109934638), (50.75, -57.475))
            ThreePointArc((50.75, -57.475), (50.370110874, -57.468584137), (49.990655048, -57.449343867))
            Line((49.990655048, -57.449343867), (-48.4, -54.125))
            ThreePointArc((-48.4, -54.125), (-56.354951288, -50.829951288), (-59.65, -42.875))
        make_face(mode=Mode.SUBTRACT)
    # profile 2 of 2: a face of its own
    with BuildSketch(Plane(origin=(0, 0, 0), x_dir=(1, 0, 0), z_dir=(0, 1, 0))):
        with Locations(Location((-10.18695891, -18.925, 0), (0, 0, 270))):
            Circle(SKETCH7_R)
    extrude(amount=CUT_EXTRUDE5_DEPTH, mode=Mode.SUBTRACT)


solid = part.part
